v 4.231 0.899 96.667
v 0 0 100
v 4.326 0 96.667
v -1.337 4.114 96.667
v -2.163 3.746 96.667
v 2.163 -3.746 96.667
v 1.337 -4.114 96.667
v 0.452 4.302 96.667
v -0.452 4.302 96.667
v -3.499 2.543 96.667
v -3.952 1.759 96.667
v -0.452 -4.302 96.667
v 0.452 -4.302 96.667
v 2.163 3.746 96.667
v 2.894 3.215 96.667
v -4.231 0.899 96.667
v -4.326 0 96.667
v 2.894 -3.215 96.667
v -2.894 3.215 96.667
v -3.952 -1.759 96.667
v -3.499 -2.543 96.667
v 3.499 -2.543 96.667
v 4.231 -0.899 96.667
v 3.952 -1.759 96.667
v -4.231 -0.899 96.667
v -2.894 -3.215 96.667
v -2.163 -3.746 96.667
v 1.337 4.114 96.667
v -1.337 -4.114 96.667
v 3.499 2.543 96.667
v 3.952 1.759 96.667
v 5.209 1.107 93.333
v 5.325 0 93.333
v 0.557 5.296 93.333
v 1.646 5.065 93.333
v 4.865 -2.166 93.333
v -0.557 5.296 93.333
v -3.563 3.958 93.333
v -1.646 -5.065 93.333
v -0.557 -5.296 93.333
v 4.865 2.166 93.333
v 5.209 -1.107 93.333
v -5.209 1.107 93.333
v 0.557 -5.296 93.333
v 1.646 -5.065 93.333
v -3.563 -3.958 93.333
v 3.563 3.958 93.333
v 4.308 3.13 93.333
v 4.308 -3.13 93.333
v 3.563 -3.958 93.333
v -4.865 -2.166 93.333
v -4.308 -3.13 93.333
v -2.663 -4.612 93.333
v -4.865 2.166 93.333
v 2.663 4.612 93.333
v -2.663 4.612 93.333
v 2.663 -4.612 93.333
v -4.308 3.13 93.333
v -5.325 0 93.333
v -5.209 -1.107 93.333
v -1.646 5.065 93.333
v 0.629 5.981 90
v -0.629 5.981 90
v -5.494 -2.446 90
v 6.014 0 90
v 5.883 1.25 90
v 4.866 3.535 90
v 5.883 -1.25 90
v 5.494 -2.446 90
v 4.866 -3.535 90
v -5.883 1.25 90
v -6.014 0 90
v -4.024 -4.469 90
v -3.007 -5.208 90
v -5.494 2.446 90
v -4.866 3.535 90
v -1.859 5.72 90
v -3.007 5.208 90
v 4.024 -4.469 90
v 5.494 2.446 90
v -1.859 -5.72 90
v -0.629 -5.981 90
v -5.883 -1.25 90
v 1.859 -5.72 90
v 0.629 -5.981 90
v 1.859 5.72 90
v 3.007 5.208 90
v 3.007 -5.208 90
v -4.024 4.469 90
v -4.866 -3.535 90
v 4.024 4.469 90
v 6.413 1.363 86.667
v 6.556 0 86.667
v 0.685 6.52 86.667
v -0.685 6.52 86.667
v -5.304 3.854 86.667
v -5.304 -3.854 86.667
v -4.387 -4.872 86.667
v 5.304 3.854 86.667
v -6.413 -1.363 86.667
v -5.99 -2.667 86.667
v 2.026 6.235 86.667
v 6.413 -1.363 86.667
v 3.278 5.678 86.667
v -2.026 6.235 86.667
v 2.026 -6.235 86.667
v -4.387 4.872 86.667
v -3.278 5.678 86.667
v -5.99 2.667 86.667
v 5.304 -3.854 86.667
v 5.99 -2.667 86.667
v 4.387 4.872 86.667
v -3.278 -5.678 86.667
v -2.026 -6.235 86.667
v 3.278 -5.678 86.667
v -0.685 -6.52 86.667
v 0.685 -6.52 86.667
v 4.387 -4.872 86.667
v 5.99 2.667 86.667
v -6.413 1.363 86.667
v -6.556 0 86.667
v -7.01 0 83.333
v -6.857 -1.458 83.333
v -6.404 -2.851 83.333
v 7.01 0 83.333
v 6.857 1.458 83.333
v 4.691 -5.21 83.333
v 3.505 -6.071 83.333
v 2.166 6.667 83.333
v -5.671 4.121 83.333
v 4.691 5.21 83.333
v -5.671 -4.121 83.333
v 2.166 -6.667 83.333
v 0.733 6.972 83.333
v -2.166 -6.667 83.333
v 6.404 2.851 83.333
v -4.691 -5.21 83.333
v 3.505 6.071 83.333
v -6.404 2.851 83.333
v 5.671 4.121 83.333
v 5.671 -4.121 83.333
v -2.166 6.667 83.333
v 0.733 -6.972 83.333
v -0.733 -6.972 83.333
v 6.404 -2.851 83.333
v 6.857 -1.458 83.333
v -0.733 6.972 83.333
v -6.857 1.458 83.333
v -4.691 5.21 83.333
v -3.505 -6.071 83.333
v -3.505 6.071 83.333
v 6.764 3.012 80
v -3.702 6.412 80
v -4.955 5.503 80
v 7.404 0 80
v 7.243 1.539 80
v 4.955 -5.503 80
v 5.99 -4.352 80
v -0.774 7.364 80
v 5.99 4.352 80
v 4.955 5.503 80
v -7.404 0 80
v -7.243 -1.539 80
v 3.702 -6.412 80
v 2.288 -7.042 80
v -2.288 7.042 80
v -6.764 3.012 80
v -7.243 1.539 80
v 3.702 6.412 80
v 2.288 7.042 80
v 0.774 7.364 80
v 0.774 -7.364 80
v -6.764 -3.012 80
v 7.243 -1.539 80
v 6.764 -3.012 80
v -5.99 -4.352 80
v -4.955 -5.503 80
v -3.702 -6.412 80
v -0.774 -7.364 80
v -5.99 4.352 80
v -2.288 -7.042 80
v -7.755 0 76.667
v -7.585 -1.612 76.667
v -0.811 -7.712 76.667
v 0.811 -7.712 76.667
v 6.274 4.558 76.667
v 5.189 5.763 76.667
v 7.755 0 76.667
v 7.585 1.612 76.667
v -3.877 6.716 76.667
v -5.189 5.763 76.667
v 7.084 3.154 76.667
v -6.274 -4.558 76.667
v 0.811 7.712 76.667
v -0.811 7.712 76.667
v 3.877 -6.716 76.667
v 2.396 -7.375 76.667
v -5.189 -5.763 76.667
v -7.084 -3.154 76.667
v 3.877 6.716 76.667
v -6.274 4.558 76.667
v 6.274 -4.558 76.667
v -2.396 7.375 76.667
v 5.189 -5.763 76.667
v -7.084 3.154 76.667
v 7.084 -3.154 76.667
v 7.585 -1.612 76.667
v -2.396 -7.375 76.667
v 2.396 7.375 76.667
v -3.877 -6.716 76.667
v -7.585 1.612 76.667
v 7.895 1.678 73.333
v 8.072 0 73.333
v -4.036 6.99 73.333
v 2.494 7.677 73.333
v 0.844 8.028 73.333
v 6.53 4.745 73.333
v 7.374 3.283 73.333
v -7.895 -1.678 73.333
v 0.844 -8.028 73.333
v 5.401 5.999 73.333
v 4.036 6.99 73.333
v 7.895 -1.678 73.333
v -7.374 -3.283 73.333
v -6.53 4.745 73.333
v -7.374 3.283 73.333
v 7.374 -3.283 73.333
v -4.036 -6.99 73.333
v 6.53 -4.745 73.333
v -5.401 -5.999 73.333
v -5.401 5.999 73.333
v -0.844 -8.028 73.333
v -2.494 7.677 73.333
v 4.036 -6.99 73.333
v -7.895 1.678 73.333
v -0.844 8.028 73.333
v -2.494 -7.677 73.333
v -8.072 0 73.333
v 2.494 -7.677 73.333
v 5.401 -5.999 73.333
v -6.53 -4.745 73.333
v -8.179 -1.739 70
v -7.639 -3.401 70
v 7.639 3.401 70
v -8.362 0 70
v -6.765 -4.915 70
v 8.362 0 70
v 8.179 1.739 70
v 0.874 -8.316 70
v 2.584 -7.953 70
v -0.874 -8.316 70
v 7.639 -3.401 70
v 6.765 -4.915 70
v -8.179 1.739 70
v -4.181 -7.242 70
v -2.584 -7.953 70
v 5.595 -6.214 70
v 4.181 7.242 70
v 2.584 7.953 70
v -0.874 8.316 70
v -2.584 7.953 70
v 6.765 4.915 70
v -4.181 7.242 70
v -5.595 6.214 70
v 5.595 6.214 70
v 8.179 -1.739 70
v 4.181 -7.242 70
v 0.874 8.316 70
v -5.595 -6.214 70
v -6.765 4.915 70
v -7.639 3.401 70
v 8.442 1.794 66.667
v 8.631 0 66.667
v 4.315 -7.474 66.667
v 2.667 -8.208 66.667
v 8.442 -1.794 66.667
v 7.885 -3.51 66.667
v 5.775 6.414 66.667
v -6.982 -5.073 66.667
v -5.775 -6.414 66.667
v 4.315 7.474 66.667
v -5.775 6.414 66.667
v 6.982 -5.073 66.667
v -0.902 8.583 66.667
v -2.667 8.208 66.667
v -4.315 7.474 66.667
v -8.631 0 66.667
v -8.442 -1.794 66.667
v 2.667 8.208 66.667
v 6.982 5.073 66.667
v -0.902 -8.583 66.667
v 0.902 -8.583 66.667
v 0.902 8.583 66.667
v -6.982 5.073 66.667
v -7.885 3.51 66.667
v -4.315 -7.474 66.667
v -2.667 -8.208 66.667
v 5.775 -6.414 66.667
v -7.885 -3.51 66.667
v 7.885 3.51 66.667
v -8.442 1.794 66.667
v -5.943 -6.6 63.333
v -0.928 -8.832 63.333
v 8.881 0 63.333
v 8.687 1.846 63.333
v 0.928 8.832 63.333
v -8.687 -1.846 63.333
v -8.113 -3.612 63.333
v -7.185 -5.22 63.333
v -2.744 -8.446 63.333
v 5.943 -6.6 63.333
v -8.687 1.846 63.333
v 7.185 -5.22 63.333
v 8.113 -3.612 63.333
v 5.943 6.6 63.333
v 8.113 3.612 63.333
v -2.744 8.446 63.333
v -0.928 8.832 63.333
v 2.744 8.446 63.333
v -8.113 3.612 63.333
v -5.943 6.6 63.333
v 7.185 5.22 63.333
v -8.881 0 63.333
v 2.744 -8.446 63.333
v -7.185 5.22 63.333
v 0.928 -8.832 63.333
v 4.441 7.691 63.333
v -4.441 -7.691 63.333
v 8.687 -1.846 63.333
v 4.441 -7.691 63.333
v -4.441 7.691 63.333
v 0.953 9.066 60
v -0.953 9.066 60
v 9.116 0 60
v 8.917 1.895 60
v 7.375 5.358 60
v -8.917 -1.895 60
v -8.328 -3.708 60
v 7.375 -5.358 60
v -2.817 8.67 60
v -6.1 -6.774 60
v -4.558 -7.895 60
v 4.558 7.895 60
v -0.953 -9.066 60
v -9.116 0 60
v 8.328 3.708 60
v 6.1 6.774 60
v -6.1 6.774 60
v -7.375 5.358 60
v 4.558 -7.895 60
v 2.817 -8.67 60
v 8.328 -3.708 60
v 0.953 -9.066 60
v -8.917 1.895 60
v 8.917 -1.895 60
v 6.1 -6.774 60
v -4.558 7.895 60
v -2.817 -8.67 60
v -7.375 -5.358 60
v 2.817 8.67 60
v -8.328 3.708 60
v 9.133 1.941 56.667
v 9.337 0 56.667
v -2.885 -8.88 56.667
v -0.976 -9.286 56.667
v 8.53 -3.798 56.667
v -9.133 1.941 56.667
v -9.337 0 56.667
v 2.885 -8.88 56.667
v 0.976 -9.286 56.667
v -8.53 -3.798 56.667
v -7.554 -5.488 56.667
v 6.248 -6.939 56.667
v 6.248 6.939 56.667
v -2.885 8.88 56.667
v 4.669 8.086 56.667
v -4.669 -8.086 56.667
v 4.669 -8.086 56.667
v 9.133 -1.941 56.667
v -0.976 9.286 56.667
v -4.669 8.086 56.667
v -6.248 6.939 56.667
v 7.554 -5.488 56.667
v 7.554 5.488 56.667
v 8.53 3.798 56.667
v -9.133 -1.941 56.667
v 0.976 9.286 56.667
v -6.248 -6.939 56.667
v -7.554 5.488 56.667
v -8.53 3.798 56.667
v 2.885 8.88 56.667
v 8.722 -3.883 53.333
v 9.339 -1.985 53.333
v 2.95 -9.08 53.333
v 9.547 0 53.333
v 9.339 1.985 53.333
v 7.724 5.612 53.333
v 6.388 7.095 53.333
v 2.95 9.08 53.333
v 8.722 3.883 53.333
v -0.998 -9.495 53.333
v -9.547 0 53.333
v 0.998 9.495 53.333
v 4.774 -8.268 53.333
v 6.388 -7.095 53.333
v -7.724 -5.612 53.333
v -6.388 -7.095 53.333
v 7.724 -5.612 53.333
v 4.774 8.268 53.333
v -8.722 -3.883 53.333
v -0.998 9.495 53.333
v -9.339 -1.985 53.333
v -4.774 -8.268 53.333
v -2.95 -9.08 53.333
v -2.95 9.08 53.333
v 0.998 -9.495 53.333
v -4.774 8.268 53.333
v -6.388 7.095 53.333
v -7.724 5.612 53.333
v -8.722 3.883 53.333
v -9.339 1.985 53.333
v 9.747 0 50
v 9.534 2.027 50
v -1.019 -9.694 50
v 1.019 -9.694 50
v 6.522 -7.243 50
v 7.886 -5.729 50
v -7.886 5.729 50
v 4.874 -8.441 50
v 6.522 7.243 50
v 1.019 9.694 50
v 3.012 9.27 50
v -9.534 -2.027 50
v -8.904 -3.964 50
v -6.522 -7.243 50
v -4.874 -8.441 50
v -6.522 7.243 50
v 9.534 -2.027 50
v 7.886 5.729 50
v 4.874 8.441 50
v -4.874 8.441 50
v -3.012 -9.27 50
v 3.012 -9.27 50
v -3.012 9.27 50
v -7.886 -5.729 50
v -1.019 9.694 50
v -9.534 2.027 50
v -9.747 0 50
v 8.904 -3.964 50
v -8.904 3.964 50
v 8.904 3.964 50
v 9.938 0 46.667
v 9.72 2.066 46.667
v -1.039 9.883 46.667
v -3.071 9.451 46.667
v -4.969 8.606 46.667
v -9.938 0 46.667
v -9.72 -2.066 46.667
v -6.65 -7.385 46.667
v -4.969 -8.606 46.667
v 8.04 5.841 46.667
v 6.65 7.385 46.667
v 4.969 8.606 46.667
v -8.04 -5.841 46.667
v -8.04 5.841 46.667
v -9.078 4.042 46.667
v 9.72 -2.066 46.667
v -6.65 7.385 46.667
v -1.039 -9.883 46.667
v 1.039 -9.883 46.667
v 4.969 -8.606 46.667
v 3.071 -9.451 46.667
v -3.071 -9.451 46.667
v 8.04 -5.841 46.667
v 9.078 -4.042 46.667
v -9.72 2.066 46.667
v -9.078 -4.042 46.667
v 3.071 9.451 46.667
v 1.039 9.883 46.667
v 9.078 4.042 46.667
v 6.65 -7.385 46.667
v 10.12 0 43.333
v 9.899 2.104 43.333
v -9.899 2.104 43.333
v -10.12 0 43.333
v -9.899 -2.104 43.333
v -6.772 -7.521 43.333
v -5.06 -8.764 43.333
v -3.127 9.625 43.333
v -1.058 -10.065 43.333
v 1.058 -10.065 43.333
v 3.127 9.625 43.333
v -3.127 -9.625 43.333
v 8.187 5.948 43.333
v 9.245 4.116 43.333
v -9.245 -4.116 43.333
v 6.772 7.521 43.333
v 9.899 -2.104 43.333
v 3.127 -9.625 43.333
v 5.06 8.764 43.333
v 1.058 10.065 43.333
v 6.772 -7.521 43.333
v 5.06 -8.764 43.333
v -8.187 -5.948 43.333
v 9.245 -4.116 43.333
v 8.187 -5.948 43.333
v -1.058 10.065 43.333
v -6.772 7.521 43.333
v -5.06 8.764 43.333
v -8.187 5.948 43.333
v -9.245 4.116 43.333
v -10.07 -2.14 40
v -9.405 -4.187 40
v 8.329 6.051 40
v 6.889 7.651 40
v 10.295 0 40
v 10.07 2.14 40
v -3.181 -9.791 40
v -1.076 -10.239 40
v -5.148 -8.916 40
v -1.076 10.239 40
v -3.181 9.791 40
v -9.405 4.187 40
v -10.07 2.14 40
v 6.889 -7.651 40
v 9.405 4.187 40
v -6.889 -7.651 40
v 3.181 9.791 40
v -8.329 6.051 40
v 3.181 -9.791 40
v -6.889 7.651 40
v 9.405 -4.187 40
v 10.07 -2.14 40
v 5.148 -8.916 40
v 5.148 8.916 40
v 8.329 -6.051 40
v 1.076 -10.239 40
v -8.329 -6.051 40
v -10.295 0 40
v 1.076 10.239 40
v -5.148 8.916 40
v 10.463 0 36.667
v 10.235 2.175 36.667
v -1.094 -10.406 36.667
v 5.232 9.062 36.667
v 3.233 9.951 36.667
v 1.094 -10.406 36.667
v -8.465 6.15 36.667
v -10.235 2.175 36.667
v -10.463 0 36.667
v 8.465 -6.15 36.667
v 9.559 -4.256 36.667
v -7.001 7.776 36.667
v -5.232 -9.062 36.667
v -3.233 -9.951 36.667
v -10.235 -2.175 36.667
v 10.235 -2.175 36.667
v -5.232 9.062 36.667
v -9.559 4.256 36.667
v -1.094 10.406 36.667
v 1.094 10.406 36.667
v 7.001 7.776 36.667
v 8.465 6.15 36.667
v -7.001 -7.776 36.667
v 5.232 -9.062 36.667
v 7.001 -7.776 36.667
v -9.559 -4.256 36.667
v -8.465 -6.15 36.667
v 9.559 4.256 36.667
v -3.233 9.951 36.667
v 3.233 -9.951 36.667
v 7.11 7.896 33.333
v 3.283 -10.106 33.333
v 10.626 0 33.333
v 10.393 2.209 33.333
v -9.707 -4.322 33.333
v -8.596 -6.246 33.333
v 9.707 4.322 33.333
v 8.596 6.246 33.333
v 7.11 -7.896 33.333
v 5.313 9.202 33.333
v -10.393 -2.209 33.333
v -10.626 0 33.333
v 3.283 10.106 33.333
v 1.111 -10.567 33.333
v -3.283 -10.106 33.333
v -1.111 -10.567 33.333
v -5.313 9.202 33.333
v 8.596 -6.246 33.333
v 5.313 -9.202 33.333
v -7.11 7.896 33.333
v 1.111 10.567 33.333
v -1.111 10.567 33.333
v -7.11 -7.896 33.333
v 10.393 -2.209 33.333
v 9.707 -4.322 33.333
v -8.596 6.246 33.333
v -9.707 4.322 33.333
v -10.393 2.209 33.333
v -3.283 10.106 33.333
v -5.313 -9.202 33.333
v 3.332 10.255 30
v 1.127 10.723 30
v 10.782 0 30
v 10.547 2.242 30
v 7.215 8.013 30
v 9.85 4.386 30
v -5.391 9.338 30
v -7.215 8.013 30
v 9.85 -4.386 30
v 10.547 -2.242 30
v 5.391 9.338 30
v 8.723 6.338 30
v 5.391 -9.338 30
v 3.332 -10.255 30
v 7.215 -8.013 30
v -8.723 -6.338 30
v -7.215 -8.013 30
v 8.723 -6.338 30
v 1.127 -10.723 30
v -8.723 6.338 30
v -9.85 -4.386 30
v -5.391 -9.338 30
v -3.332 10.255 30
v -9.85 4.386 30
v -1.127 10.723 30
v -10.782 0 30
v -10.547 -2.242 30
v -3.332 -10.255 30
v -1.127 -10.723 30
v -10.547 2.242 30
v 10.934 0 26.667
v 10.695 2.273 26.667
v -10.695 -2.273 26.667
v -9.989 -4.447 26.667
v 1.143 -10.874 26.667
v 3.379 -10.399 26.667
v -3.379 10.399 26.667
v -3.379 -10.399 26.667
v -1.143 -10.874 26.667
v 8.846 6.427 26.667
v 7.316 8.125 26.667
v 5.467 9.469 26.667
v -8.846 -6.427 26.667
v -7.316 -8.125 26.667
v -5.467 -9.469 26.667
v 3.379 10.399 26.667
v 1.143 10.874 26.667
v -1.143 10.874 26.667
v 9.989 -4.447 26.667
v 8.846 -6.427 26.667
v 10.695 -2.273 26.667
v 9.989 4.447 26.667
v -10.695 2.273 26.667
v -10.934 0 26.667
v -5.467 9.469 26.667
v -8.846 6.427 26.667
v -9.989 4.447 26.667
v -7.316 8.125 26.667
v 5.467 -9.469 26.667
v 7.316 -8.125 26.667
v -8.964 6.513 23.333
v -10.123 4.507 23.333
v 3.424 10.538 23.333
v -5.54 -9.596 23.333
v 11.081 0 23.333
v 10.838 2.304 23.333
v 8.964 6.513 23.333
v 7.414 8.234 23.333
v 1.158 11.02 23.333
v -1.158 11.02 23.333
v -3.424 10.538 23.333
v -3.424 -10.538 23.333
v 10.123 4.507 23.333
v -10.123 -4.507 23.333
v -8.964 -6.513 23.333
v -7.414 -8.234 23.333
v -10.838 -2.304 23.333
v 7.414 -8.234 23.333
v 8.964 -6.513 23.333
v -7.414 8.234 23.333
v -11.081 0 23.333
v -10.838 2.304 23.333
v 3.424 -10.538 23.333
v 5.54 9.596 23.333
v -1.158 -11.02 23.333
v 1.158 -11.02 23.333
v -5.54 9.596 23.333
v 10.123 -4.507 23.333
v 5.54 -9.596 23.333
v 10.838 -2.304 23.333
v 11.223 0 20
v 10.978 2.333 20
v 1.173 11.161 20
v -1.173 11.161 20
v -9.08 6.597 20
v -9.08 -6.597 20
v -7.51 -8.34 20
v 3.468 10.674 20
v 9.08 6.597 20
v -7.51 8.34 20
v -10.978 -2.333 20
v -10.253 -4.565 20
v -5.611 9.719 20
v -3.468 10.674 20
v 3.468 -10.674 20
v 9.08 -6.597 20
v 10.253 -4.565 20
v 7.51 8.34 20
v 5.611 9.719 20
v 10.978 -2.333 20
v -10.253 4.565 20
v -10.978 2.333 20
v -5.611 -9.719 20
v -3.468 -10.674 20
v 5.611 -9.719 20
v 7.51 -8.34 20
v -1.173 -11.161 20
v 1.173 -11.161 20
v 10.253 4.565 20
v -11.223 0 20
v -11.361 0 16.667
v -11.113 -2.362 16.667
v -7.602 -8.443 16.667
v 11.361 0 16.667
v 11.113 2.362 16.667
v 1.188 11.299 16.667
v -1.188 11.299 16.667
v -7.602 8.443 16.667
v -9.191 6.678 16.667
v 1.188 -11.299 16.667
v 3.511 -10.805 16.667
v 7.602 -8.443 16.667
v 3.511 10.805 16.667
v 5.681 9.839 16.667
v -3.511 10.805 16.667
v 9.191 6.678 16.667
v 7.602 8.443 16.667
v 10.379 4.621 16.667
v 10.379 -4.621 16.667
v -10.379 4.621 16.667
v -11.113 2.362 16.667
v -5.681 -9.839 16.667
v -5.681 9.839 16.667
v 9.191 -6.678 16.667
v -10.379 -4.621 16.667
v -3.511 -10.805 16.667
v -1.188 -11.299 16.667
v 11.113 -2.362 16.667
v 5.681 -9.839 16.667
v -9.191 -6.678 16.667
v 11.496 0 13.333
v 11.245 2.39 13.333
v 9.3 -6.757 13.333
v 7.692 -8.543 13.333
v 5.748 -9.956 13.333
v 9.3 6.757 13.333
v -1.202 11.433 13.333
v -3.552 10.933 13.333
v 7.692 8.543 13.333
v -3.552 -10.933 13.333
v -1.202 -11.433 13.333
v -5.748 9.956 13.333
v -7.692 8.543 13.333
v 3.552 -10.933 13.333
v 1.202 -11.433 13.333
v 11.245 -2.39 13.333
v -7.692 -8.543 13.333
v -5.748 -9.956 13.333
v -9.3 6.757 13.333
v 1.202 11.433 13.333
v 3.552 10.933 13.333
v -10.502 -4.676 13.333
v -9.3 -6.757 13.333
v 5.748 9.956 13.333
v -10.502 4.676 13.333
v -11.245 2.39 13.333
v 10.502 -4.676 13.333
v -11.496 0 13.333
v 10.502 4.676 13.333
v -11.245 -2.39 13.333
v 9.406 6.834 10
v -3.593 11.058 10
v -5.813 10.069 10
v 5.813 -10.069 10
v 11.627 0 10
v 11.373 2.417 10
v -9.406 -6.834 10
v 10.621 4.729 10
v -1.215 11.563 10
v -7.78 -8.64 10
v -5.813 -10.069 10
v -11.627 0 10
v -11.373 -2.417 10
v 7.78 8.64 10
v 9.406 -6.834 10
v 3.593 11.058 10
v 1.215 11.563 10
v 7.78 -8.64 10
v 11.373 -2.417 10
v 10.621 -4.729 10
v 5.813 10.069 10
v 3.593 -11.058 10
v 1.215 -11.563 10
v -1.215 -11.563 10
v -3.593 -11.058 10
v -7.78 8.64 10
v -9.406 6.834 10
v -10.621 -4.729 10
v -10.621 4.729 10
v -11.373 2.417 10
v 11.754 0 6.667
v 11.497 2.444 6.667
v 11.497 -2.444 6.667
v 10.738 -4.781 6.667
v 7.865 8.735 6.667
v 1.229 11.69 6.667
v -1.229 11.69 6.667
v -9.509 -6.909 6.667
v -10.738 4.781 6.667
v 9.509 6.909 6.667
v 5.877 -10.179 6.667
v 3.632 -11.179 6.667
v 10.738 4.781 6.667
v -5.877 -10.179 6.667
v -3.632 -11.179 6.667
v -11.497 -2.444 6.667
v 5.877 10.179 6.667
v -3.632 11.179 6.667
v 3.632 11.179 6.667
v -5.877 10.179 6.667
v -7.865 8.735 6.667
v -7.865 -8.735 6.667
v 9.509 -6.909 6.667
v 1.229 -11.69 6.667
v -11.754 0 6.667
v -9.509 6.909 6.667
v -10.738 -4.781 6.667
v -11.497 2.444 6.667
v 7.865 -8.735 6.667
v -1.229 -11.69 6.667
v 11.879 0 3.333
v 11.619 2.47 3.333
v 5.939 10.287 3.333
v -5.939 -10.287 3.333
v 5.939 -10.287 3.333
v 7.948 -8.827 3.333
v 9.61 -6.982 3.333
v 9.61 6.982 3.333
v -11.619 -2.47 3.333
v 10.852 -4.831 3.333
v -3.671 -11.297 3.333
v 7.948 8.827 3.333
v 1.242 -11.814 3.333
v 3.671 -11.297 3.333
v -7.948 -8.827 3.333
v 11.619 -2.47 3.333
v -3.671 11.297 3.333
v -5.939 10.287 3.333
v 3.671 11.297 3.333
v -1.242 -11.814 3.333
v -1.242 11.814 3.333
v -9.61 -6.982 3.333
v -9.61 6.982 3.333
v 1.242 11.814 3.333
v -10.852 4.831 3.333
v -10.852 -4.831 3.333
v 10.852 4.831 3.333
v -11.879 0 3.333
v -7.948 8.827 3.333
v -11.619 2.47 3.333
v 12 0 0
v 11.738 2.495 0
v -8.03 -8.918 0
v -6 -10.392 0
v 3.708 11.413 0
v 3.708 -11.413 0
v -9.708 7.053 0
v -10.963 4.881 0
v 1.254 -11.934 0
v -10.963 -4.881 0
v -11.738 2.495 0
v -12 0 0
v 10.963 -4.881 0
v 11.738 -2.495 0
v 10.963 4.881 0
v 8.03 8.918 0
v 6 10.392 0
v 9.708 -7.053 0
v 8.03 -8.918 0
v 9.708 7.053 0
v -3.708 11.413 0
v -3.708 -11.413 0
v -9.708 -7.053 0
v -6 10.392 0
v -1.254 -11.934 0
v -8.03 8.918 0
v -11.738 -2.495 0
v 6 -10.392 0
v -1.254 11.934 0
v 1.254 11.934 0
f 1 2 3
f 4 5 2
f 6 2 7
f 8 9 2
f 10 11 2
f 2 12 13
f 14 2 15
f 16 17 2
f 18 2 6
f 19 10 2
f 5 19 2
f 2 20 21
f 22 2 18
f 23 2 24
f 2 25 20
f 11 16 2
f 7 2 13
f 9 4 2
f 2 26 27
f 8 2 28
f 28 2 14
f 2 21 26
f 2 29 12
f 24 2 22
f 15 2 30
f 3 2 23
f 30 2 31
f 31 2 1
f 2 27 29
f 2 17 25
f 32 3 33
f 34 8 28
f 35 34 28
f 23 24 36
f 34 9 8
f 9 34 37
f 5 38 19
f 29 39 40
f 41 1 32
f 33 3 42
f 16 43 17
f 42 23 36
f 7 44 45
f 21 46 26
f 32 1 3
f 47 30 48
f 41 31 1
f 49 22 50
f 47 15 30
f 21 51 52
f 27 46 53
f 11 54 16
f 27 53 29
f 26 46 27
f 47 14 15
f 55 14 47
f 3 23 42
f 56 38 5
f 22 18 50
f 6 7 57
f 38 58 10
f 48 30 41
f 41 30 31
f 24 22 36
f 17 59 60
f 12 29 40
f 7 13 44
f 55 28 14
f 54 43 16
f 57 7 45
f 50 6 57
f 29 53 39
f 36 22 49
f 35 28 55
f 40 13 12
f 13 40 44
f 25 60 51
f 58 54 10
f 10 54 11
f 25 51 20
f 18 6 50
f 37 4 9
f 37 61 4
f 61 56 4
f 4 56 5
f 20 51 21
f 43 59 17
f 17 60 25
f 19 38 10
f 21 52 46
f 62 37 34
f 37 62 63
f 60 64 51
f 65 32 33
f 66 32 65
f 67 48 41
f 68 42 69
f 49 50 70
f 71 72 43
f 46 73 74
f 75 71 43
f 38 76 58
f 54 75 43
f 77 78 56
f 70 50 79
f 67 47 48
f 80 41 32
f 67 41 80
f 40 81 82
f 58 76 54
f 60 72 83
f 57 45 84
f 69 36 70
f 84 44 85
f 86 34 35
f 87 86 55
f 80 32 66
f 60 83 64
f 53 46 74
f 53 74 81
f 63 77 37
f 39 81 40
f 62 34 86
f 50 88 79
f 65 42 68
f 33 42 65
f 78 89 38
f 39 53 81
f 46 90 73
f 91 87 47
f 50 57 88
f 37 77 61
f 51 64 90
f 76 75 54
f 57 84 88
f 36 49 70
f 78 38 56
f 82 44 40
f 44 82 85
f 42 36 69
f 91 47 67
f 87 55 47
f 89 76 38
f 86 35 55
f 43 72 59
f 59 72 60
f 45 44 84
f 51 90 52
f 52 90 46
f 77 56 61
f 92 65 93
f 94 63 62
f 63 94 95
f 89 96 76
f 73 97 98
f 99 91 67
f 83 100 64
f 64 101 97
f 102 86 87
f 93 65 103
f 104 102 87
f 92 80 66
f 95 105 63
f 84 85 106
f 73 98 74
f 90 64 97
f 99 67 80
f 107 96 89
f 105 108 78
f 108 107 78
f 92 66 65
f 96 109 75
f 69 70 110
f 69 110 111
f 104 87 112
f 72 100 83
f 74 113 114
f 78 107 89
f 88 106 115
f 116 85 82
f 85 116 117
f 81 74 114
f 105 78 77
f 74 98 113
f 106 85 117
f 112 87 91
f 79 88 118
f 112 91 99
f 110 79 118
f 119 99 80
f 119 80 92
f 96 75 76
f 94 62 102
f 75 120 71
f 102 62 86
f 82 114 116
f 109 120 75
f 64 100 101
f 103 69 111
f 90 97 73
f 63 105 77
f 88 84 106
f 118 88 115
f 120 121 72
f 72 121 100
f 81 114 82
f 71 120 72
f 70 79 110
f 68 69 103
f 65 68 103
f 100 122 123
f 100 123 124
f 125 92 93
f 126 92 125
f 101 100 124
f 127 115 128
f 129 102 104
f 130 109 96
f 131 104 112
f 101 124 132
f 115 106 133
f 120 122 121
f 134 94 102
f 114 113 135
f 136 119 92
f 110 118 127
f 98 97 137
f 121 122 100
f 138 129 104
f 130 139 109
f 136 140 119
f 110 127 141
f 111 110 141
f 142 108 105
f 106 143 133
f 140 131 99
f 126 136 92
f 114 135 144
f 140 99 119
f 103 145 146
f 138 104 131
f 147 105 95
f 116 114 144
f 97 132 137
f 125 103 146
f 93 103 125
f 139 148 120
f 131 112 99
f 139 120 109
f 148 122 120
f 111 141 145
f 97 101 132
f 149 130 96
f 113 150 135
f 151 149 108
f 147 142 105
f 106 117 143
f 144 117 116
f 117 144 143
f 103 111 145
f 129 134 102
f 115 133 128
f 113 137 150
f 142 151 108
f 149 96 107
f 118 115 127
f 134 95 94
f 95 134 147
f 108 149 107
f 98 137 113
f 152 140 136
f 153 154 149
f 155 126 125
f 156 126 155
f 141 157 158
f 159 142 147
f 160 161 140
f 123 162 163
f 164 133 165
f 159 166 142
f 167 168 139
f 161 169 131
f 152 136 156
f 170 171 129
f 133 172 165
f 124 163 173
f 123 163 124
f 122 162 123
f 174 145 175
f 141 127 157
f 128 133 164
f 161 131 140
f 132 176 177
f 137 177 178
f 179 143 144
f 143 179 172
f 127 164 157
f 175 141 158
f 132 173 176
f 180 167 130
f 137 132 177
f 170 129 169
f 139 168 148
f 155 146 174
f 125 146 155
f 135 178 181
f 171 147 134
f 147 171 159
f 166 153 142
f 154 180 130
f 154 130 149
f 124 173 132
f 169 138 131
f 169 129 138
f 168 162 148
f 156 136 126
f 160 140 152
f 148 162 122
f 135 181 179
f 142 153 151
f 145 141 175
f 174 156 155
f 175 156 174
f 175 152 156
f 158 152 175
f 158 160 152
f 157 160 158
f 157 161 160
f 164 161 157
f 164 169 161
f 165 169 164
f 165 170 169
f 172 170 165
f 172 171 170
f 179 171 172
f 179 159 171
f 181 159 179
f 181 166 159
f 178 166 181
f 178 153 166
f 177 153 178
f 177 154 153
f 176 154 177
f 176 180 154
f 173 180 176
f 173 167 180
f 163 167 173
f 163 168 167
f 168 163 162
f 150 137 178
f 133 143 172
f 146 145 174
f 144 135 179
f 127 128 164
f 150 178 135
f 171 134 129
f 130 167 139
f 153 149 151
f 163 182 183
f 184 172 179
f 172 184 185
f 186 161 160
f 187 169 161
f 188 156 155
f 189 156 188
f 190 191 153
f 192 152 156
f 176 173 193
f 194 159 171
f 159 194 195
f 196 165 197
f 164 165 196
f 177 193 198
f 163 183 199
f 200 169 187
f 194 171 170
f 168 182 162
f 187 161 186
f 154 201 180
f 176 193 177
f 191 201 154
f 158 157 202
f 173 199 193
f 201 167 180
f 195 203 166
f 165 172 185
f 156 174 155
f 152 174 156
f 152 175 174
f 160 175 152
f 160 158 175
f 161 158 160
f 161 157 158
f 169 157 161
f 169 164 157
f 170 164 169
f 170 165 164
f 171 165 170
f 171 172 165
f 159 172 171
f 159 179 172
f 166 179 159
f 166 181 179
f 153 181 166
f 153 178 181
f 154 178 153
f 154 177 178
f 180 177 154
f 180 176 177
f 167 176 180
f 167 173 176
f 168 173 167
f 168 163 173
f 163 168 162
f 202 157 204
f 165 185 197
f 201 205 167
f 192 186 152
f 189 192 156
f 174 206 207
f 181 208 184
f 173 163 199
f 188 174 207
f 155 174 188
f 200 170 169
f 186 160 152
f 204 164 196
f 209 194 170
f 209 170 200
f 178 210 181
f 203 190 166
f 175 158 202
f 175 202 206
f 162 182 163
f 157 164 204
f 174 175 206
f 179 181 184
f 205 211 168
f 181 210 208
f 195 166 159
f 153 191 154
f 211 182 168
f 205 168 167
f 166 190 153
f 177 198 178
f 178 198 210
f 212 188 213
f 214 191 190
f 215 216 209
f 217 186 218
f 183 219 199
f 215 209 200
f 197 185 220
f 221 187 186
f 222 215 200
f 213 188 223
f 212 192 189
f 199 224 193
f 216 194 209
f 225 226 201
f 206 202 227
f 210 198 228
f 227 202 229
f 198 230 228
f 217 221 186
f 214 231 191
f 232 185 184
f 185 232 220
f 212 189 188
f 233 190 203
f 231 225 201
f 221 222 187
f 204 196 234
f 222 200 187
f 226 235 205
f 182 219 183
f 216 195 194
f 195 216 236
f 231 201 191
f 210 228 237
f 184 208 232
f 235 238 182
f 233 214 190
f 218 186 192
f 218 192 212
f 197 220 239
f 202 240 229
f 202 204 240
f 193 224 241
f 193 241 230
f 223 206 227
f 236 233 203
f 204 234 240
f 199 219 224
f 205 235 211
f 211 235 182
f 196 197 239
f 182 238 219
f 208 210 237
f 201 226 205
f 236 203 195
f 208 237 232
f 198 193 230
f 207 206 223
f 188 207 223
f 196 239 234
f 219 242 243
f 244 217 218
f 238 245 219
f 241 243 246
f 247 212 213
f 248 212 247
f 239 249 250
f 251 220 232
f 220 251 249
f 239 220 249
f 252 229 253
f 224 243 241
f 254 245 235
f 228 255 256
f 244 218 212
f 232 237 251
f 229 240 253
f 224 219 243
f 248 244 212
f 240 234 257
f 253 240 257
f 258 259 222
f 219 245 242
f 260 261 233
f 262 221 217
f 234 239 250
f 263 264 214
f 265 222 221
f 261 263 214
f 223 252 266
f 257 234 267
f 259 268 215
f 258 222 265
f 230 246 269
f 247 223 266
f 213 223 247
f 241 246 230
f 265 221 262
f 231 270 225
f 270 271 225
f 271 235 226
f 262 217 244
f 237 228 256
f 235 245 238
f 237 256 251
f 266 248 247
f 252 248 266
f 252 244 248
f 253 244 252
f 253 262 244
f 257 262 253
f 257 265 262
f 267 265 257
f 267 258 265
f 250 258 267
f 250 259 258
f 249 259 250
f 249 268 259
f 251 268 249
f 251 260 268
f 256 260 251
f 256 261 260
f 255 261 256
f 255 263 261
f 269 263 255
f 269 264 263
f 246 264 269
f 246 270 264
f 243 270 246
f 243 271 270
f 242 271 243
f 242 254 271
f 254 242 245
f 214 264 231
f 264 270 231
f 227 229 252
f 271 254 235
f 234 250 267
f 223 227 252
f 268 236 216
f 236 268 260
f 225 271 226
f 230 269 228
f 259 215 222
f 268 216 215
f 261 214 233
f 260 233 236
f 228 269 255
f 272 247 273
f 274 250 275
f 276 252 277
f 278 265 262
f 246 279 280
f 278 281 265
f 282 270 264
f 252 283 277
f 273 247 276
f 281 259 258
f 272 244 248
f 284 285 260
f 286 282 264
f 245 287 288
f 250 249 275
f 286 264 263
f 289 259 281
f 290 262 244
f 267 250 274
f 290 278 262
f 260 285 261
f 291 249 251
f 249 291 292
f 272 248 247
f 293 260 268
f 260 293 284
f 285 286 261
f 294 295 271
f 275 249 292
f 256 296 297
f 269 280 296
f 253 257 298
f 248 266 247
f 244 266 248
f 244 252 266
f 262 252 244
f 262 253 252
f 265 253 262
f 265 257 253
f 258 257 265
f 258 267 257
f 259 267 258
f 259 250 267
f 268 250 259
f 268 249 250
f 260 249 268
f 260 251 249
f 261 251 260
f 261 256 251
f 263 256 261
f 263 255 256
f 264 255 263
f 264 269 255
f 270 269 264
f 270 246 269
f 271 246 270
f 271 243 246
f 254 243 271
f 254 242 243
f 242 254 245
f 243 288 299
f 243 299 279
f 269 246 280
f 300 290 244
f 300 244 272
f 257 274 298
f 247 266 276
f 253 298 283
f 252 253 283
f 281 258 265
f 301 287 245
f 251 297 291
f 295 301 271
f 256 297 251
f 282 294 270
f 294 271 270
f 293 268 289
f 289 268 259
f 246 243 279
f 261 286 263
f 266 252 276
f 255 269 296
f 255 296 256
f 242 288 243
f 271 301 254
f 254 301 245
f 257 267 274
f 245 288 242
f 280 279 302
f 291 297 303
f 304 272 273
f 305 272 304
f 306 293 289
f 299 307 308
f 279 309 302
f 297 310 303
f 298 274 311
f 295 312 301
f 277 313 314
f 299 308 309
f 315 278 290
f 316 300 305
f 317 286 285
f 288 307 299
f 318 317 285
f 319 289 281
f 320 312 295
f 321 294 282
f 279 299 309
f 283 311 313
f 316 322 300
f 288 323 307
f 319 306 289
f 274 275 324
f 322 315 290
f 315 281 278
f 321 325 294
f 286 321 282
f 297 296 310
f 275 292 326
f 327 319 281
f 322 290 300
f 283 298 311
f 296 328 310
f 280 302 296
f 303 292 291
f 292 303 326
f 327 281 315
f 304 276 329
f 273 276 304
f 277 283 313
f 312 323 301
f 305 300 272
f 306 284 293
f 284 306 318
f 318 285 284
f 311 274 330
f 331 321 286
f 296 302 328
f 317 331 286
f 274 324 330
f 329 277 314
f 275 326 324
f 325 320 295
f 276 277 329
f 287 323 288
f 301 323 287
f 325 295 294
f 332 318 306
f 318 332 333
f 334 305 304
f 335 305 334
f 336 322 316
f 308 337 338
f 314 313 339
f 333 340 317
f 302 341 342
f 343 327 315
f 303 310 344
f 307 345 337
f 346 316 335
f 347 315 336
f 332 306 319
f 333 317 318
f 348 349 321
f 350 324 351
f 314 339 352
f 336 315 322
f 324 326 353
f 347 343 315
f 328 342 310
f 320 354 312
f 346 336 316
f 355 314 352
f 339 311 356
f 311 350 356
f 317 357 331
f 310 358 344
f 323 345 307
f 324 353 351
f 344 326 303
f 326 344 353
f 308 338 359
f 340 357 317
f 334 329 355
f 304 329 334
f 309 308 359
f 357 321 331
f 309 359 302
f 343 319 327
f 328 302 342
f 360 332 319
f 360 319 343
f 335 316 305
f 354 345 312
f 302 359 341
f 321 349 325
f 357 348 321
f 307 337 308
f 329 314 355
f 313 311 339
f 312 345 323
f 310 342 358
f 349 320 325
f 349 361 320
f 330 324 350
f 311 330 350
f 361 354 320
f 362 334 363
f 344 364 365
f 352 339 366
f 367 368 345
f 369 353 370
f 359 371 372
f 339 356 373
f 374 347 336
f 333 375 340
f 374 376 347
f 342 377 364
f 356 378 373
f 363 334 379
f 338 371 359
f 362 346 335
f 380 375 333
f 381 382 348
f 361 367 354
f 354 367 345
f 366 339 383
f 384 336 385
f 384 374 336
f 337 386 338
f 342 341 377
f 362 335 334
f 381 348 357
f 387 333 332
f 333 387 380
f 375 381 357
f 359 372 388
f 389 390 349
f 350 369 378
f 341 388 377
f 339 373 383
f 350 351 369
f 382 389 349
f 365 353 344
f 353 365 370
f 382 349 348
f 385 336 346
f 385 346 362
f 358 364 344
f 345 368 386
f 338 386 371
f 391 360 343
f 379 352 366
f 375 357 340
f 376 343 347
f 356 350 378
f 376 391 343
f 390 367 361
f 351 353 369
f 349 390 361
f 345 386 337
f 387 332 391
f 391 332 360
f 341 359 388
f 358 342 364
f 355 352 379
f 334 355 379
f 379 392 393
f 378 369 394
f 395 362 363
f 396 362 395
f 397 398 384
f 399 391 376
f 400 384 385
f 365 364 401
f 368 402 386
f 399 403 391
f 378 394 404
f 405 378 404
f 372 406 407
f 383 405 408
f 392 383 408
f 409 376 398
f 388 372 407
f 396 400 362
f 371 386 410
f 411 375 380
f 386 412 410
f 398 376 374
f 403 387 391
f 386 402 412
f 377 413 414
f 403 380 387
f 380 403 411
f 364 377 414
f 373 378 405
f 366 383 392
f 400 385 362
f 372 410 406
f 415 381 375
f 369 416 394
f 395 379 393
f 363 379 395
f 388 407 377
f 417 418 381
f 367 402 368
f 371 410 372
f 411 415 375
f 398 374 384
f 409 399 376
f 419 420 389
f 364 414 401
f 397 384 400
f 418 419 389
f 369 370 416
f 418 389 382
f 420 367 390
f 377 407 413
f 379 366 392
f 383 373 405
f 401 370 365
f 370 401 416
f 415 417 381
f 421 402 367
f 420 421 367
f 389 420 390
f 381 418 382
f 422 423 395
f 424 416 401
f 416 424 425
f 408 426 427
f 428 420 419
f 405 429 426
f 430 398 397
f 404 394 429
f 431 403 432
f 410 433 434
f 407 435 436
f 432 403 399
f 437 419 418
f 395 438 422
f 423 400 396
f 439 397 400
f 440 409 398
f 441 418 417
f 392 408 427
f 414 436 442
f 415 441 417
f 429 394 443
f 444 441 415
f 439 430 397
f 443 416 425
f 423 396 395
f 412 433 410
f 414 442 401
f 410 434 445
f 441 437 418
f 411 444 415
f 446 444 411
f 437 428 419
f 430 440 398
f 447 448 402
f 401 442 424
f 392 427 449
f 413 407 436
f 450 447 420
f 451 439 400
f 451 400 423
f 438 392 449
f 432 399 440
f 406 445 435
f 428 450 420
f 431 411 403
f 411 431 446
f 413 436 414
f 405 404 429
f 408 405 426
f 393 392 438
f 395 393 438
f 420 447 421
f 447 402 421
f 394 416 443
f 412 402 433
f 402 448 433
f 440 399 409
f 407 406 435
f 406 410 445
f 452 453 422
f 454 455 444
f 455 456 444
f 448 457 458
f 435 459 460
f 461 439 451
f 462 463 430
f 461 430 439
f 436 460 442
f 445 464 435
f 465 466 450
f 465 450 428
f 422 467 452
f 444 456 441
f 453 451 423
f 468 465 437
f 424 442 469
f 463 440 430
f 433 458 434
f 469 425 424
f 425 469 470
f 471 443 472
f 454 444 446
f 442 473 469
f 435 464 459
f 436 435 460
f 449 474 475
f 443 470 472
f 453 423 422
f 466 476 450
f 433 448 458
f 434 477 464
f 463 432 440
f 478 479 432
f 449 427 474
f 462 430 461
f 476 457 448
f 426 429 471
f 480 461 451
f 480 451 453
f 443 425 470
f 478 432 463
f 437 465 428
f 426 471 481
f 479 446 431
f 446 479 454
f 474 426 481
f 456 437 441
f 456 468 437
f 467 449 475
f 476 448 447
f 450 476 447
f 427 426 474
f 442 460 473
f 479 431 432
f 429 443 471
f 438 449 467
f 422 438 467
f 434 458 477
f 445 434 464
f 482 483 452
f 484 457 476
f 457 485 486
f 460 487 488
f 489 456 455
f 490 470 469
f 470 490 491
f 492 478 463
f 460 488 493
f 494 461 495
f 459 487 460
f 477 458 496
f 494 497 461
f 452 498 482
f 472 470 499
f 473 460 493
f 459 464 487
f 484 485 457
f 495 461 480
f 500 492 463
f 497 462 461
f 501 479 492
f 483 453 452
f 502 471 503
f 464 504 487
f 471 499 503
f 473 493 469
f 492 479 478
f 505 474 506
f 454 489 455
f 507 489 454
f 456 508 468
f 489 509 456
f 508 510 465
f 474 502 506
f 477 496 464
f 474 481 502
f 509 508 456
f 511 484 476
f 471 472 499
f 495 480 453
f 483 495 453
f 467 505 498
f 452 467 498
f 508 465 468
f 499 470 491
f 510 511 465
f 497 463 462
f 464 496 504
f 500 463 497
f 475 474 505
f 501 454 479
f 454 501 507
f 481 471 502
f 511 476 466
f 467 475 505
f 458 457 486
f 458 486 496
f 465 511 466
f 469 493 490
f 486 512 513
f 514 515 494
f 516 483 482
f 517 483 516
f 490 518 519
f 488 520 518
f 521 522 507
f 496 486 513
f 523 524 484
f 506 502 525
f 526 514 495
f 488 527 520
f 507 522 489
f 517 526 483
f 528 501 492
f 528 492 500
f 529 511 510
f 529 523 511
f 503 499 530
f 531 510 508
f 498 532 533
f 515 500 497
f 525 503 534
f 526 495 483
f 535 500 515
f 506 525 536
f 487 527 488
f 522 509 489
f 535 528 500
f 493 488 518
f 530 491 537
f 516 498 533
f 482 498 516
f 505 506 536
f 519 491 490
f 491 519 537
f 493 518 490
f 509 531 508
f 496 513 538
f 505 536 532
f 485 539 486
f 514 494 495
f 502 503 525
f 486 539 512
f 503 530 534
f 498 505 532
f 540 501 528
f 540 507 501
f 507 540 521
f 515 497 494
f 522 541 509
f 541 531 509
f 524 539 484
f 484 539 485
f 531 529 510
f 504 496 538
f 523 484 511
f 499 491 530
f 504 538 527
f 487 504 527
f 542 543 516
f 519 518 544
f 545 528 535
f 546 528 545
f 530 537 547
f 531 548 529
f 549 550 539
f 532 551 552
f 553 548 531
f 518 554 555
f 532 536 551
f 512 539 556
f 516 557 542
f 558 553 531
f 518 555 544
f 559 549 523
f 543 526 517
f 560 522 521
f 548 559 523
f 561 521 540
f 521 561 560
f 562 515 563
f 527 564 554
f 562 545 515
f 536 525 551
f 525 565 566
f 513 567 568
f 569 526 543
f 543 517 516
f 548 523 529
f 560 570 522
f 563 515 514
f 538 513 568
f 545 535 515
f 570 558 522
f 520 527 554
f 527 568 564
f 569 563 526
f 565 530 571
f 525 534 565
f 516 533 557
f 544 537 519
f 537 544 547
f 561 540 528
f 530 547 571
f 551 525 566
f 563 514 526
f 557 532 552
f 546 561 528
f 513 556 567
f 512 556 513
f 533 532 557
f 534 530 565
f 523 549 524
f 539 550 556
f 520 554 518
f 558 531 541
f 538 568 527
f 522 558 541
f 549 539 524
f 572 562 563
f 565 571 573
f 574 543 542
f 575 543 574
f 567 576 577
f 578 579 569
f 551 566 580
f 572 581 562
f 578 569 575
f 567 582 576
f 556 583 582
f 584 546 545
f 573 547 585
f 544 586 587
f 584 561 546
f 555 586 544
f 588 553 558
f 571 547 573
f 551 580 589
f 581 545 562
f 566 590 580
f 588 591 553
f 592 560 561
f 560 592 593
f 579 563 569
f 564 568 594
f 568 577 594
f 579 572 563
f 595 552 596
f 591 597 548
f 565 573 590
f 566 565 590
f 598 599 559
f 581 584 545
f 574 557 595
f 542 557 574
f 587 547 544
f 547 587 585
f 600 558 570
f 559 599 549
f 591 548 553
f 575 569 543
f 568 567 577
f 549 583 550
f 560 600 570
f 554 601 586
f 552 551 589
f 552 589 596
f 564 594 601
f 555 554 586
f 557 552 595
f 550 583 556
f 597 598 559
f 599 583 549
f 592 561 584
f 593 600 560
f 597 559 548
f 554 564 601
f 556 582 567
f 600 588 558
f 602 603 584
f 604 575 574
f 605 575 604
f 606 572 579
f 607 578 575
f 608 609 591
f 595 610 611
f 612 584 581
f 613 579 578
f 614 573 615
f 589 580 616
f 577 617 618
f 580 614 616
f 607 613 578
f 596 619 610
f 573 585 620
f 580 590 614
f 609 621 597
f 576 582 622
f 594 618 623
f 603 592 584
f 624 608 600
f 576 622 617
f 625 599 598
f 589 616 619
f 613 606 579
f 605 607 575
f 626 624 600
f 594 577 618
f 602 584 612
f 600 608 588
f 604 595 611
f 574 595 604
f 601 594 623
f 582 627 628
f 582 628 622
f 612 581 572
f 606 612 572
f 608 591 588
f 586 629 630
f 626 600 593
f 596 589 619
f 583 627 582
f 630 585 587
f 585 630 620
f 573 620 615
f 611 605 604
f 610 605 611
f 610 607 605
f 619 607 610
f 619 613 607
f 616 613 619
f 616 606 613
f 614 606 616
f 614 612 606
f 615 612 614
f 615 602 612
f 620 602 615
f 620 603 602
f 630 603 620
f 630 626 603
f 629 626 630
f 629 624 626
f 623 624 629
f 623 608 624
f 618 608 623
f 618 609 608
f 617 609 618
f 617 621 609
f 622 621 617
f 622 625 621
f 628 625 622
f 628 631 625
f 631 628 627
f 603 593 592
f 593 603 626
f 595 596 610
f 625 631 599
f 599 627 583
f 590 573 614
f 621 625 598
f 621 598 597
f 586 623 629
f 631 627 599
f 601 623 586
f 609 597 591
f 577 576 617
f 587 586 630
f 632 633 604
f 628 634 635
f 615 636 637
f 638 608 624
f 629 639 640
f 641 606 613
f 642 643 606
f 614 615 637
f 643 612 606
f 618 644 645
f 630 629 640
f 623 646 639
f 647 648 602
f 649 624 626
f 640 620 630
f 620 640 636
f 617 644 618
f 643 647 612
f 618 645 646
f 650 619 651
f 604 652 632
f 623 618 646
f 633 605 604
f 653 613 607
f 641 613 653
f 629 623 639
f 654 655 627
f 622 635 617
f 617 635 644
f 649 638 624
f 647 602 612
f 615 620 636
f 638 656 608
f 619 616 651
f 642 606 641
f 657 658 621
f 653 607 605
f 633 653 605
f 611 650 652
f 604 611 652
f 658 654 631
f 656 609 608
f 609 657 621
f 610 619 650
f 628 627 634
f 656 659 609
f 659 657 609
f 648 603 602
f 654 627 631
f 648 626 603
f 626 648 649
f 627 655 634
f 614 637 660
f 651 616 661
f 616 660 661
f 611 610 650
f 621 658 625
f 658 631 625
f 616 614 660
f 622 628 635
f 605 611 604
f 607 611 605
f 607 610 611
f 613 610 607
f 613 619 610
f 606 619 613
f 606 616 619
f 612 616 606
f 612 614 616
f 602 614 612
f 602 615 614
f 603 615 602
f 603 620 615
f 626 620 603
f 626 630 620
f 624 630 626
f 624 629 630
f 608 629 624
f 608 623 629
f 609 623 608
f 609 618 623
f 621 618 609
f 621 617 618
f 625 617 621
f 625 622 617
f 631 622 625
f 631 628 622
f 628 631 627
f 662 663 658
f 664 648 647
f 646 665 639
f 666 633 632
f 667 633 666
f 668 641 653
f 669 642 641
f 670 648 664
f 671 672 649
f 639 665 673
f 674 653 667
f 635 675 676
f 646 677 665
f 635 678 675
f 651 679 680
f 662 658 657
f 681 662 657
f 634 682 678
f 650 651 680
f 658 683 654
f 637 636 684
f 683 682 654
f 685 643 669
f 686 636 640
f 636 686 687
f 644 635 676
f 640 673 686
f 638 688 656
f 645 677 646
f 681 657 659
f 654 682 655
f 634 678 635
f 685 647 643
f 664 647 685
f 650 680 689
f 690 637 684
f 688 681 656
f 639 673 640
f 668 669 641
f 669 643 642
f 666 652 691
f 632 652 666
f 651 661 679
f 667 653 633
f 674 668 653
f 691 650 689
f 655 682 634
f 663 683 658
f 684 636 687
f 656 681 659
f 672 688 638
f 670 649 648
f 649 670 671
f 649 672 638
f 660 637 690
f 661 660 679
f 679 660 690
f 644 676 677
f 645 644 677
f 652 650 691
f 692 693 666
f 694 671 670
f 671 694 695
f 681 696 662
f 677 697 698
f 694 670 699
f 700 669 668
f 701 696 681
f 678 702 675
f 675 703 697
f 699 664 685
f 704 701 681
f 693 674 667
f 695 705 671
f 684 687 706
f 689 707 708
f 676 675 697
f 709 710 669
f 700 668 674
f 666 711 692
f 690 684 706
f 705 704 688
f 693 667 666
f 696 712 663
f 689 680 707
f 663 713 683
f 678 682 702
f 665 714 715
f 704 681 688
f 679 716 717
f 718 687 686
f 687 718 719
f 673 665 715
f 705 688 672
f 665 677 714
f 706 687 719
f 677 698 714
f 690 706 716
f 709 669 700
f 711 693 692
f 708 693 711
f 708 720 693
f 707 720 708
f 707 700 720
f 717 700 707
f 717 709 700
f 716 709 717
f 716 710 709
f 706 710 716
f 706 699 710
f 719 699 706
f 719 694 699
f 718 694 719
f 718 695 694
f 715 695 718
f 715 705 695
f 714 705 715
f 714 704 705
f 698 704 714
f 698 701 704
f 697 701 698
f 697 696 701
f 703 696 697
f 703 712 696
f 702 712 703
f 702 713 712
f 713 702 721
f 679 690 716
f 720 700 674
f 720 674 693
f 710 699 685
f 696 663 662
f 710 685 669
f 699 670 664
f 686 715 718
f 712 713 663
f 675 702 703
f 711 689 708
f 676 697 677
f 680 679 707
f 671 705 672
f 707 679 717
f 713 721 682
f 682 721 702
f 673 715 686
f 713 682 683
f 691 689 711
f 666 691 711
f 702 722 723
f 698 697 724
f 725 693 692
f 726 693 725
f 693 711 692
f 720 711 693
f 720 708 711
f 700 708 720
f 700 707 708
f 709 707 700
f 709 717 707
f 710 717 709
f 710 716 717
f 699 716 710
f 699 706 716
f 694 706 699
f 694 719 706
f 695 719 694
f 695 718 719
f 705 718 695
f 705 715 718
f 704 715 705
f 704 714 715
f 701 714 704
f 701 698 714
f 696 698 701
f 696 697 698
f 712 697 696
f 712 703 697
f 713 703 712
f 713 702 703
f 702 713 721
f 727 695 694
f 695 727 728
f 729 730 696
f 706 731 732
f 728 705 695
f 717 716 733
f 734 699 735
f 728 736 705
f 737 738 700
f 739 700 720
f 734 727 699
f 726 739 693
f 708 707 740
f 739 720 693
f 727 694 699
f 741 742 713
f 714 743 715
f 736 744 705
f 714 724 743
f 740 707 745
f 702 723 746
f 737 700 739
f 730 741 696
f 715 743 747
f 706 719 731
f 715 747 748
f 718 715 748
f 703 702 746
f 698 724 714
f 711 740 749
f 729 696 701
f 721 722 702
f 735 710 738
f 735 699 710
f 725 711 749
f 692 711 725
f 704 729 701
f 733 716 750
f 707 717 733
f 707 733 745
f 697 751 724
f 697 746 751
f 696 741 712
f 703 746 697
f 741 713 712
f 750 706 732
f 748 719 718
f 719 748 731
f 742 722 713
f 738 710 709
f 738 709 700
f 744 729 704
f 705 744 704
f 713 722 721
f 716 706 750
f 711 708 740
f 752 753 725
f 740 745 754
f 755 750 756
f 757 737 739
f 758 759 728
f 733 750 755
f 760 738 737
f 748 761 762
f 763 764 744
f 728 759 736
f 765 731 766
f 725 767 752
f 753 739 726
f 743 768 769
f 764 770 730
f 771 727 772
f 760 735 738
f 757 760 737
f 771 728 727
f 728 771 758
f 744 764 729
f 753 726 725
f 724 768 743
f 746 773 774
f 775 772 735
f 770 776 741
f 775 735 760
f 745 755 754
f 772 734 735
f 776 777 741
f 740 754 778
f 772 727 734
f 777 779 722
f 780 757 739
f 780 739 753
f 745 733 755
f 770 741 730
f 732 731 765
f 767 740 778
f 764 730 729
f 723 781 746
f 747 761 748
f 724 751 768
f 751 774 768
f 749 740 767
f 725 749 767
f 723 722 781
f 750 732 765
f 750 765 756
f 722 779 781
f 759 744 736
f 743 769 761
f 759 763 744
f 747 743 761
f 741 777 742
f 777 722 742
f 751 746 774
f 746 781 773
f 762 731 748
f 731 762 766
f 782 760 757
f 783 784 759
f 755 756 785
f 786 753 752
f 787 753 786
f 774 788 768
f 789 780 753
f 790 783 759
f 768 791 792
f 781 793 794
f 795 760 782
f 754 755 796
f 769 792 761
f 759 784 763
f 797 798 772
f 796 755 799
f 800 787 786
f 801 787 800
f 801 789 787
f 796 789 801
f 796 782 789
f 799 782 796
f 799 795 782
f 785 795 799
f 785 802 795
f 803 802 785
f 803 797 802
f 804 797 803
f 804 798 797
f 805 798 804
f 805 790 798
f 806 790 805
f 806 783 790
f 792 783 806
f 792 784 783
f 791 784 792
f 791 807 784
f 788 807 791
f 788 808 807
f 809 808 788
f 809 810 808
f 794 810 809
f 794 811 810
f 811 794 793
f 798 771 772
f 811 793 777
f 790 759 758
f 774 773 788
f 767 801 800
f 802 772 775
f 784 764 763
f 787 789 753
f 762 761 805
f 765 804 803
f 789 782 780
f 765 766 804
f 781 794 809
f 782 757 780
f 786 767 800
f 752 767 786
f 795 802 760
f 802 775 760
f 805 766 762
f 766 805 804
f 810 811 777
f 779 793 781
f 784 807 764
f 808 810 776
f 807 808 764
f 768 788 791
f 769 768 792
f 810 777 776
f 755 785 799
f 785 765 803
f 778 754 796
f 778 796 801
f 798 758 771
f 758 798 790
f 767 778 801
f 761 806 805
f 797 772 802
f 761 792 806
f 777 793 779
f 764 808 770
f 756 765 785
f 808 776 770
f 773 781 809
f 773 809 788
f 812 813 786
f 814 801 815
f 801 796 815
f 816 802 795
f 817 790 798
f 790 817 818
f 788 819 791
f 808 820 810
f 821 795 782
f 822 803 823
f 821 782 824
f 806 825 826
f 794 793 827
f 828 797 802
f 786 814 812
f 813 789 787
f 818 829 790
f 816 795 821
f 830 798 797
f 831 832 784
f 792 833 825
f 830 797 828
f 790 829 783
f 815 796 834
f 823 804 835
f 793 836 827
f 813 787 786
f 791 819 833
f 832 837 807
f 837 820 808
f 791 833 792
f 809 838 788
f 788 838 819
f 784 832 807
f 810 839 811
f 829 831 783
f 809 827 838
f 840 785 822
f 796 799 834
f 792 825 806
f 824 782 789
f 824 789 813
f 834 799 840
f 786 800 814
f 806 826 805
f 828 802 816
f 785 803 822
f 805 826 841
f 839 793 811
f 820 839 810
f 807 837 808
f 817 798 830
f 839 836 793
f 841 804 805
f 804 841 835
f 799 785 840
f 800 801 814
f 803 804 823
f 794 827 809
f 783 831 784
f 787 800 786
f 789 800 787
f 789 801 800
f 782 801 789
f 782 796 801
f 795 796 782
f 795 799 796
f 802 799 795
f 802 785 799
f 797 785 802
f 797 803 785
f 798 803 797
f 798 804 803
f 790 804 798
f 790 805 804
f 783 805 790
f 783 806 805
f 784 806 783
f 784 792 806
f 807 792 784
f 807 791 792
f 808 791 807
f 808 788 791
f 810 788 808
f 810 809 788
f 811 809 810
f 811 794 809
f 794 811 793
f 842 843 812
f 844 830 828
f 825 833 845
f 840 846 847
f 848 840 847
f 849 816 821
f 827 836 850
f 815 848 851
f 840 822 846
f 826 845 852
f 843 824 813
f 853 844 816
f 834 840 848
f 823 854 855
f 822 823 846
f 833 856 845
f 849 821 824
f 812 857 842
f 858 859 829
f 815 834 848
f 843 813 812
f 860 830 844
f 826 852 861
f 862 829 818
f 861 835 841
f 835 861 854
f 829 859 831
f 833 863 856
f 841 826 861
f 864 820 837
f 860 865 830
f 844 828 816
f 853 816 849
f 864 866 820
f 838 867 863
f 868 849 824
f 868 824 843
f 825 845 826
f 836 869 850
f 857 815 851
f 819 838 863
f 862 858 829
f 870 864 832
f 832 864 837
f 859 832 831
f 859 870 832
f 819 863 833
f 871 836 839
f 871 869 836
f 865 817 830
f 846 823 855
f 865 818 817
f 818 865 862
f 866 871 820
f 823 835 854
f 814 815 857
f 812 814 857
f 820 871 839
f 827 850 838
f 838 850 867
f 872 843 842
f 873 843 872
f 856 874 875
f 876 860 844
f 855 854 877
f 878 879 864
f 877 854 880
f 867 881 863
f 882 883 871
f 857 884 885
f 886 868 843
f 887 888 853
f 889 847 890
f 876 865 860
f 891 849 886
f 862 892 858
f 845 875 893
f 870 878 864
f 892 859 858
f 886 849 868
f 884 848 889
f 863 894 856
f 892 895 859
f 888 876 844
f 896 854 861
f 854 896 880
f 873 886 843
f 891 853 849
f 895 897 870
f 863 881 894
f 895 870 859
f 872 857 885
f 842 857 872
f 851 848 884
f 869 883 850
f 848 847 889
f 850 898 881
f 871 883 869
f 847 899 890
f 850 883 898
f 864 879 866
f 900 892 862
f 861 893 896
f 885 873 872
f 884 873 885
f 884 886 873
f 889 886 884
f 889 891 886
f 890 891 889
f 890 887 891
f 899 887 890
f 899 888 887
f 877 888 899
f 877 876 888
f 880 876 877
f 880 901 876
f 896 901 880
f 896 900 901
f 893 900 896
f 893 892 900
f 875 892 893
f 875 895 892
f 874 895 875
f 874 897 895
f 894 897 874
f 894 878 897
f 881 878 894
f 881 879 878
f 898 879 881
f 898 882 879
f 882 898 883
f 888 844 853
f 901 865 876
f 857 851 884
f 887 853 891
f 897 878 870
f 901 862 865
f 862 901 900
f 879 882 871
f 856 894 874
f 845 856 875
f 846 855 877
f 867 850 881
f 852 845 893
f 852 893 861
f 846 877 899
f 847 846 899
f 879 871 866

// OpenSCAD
/* Power serie */

/* y = R(x/L)^n
Where:

    n = 1 for a cone
    n = 0.75 for a 3/4 power
    n = 0.5 for a 1/2 power (parabola)
    n = 0 for a cylinder 
*/

n= 0.3;
L= 100;
R=24/2;
nof = 30;
//A1=0;
//A2=0;
$fn=30;
H2=L/nof;

module ogive()
{

	for (i=[1:nof]) {

		assign(A1 = R* pow(((L/nof)*(i-1)/L),n),
		A2 = R* pow(((L/nof)*(i)/L),n),
H1= (L/nof)*i)
		{
	  translate ([0,0, L- H1]) cylinder (r1 = A2, r2 = A1 , h= H2);
		echo("i=", i ,"h=",H1,"R1:",A1,"R2:", A2);
		}
	}
}

ogive();
